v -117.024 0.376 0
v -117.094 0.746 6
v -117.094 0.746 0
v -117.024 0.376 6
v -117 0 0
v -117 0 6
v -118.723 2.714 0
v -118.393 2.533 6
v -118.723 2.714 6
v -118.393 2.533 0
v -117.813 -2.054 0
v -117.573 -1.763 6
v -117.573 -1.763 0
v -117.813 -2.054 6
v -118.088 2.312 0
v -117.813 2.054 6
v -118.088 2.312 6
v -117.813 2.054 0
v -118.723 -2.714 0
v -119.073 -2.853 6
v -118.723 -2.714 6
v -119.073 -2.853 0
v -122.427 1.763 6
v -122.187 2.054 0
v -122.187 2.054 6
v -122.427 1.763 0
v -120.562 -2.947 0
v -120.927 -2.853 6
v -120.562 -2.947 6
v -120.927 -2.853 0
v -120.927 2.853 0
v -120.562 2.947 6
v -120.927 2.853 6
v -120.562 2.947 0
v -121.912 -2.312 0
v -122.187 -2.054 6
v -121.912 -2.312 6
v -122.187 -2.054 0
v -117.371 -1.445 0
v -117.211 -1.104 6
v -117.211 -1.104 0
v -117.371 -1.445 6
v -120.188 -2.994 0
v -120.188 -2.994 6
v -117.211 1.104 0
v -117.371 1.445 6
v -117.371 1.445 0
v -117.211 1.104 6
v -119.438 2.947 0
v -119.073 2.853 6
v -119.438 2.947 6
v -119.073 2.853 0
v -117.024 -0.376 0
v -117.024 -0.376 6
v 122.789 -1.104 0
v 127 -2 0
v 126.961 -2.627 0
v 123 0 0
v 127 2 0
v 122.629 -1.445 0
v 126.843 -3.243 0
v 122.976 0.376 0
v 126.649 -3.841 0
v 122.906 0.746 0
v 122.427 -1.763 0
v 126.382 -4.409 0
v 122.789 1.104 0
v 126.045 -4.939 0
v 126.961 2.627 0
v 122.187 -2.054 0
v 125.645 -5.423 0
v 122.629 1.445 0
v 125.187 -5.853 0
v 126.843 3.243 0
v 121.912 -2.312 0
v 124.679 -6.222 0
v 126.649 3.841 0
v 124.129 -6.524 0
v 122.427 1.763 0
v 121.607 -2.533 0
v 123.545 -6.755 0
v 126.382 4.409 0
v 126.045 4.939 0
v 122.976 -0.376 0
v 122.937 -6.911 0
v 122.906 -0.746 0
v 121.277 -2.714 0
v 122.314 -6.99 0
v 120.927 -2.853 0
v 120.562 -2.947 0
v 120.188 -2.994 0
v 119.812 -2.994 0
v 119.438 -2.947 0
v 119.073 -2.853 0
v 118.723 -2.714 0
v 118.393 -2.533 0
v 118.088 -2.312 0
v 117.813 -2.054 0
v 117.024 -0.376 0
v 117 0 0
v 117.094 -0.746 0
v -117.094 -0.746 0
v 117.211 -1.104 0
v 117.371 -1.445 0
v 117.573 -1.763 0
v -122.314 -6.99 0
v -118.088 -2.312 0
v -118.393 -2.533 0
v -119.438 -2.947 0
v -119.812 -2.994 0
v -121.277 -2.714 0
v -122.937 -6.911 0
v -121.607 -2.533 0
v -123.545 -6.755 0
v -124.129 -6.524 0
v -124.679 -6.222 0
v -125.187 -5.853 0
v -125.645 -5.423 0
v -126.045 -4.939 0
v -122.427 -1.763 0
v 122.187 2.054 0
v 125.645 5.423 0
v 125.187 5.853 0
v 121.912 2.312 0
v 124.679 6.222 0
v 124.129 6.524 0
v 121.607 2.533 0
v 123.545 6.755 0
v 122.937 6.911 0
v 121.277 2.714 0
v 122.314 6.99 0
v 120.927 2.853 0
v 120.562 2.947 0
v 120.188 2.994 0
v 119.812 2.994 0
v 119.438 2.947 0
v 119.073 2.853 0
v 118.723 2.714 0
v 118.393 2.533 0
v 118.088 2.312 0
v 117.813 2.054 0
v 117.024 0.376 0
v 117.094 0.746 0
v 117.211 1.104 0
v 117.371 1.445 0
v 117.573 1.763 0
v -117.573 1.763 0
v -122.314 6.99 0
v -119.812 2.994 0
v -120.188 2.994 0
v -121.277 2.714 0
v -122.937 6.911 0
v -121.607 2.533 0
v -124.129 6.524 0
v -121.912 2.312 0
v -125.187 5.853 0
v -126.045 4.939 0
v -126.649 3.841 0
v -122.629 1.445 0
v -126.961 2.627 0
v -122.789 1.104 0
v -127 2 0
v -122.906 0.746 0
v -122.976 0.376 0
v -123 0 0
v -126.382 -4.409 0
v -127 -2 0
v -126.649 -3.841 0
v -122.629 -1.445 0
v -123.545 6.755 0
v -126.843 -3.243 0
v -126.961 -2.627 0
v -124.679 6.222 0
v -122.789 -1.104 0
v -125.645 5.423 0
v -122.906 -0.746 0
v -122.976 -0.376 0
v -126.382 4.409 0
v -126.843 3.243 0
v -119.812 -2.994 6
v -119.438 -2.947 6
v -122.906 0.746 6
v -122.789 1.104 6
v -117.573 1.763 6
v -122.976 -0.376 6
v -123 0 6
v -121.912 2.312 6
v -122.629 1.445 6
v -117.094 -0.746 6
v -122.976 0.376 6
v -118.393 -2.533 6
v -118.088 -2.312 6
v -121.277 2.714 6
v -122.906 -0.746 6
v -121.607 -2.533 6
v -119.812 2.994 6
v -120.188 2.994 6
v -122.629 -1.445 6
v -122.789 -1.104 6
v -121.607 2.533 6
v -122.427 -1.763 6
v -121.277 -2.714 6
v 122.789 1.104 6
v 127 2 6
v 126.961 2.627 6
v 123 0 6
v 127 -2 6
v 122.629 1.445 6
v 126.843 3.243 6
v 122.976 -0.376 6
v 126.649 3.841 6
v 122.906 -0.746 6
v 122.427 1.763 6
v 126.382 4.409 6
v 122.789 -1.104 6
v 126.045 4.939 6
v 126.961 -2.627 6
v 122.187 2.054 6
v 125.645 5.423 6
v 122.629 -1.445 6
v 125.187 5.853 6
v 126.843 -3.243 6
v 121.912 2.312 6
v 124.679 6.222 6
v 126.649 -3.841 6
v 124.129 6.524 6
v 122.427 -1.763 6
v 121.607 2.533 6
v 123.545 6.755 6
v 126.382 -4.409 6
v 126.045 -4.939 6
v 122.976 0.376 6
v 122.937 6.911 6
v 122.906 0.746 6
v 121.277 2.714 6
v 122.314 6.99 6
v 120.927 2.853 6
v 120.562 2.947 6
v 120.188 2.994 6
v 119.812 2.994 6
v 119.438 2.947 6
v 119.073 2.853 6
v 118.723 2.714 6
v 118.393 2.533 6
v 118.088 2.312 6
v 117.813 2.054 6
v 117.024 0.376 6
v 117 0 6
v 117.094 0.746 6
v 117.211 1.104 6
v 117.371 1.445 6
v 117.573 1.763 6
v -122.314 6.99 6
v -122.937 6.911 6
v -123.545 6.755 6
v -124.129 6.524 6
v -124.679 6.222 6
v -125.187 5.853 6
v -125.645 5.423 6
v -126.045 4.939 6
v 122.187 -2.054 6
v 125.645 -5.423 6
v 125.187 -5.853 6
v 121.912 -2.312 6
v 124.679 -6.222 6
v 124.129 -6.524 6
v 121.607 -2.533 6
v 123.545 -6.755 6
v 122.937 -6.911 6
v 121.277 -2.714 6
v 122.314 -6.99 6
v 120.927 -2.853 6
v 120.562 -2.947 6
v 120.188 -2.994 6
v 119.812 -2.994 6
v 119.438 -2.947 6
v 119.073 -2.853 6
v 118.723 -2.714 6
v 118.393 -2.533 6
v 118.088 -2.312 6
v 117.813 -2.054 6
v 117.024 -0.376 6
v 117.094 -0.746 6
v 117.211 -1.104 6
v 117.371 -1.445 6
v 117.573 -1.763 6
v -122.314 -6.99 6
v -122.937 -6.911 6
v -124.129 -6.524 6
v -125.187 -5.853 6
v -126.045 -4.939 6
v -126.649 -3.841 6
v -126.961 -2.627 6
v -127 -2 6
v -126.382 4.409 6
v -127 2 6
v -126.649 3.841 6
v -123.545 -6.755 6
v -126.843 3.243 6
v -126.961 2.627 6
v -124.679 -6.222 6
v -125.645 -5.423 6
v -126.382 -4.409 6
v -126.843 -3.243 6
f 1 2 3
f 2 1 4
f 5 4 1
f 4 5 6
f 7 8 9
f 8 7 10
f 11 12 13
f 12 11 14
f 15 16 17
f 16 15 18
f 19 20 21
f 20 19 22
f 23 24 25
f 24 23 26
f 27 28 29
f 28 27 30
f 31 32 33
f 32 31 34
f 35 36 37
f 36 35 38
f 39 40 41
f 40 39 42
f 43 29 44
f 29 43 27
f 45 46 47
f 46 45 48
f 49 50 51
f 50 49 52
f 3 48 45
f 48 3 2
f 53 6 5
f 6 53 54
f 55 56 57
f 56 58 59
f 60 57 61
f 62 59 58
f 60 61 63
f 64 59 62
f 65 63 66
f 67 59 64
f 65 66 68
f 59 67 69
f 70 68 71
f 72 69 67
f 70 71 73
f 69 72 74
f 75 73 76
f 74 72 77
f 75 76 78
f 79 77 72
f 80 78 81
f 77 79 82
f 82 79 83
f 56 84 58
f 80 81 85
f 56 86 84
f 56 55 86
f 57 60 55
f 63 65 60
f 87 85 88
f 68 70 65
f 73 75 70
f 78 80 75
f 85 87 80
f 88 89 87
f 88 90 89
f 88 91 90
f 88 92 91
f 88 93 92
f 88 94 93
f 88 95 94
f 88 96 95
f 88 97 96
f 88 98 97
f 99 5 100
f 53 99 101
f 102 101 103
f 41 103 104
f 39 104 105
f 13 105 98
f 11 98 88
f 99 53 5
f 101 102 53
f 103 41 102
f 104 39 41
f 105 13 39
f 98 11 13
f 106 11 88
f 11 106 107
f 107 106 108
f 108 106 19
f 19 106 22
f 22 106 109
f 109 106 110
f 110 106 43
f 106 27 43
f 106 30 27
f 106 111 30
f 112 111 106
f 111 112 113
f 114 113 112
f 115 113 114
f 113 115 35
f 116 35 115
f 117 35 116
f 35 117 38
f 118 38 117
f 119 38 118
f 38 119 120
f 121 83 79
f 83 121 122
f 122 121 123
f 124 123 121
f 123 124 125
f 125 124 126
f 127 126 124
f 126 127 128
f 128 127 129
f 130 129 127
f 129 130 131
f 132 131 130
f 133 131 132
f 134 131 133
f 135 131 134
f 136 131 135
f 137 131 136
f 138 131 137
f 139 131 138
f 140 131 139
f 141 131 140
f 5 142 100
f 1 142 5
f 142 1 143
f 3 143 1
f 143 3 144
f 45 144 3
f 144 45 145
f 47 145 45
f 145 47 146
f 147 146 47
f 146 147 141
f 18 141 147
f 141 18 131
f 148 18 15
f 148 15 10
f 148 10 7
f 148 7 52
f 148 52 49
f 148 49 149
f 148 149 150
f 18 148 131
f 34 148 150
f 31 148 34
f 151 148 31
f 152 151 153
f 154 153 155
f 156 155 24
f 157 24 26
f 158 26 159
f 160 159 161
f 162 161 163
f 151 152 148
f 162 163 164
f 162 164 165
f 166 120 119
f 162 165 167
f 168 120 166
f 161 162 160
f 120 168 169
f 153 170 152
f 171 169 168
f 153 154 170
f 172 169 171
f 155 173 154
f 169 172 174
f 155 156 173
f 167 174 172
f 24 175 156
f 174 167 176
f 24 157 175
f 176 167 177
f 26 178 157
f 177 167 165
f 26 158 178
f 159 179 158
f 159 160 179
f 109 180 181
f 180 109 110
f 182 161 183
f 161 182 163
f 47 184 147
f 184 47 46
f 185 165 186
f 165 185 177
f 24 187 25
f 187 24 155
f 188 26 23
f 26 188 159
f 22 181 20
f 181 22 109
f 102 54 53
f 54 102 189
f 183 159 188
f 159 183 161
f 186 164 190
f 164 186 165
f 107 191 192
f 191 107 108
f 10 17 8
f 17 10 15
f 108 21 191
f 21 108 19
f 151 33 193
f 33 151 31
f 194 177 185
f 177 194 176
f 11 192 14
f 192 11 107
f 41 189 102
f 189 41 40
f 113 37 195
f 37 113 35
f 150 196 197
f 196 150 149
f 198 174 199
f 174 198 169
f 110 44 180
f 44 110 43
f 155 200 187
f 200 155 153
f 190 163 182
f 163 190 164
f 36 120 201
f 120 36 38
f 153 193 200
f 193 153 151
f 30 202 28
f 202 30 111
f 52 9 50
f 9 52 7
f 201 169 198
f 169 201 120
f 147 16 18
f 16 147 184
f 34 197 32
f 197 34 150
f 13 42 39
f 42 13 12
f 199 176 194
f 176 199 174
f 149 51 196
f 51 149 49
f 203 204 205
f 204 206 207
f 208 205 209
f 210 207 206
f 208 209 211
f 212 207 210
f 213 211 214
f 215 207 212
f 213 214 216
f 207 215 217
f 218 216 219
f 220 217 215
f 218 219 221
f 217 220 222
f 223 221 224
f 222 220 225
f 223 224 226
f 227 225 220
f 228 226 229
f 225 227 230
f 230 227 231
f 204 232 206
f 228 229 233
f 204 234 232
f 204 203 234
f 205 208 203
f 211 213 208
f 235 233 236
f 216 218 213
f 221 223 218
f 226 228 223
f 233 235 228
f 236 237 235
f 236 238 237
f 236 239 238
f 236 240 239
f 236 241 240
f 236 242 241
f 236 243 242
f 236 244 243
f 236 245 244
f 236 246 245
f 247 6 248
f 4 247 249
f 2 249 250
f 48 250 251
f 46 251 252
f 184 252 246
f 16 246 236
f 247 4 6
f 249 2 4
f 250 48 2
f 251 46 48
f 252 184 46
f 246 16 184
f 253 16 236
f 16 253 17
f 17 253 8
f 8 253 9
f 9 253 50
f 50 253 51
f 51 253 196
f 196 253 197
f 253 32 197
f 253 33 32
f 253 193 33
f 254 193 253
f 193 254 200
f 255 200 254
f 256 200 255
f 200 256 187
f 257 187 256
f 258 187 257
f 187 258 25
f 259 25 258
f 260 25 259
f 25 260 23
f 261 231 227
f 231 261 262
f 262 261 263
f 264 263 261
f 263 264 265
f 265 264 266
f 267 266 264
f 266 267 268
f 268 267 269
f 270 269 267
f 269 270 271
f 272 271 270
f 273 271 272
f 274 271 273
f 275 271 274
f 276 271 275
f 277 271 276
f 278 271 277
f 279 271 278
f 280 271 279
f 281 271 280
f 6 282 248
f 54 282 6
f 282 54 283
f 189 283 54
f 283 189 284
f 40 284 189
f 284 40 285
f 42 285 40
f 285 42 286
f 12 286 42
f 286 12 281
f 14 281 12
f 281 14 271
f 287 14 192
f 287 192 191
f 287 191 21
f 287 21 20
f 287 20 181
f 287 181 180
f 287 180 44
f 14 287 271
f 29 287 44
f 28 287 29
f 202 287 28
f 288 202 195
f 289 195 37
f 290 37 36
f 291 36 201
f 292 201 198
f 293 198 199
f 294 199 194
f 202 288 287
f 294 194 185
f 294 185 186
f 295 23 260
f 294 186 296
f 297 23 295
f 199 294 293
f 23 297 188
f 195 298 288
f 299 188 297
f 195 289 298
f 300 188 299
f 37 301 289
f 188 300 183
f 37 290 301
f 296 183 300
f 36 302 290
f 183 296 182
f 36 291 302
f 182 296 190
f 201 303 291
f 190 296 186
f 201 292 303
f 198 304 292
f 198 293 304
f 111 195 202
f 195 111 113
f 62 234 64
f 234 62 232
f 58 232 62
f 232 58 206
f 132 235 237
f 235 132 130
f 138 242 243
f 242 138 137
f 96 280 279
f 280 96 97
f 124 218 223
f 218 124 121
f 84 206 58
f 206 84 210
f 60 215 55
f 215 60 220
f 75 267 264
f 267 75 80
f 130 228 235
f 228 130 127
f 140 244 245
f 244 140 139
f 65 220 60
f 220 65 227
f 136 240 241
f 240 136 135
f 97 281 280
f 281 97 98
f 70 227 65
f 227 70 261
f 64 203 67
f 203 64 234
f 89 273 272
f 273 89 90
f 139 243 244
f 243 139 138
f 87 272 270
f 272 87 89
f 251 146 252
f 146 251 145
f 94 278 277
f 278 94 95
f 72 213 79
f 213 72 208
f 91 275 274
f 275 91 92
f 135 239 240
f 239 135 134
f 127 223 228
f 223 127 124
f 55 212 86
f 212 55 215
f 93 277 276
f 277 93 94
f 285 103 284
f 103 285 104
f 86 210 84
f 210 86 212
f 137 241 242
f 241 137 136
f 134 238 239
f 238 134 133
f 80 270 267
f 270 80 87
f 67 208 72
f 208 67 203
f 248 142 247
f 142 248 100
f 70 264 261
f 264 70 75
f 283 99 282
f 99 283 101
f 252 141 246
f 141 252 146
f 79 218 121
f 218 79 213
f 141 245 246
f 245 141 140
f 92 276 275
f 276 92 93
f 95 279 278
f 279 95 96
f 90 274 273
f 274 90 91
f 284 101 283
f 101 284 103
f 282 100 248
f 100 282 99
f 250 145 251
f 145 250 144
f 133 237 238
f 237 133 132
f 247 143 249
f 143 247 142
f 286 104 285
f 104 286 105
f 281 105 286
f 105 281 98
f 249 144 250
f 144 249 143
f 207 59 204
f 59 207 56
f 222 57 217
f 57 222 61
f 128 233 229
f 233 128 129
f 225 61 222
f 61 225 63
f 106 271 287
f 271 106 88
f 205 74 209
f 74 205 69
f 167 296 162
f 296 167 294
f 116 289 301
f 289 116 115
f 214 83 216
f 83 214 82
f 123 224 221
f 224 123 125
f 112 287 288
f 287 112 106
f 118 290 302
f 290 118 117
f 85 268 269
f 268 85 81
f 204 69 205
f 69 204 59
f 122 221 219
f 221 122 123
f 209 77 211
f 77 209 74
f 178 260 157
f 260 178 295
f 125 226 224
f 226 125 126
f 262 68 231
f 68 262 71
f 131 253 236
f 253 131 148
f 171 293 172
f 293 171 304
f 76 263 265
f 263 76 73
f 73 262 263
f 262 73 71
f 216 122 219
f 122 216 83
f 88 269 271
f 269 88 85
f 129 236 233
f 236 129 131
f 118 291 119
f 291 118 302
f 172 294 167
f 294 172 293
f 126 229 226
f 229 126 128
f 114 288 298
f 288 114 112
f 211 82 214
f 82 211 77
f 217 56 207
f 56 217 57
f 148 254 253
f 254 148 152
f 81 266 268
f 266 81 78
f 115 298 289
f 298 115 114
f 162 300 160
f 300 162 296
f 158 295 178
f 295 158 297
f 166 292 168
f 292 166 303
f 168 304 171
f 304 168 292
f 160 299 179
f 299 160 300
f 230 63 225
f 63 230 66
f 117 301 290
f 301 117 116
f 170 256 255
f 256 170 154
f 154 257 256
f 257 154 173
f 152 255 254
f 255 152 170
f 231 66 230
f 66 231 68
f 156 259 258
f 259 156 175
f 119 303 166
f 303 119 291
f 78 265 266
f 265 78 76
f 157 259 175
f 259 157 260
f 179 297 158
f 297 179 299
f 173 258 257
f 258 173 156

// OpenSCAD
$fn = 50;


difference() {
	union() {
		hull() {
			translate(v = [-122.0000000000, 2.0000000000, 0]) {
				cylinder(h = 6, r = 5);
			}
			translate(v = [122.0000000000, 2.0000000000, 0]) {
				cylinder(h = 6, r = 5);
			}
			translate(v = [-122.0000000000, -2.0000000000, 0]) {
				cylinder(h = 6, r = 5);
			}
			translate(v = [122.0000000000, -2.0000000000, 0]) {
				cylinder(h = 6, r = 5);
			}
		}
	}
	union() {
		translate(v = [-120.0000000000, 0.0000000000, 0]) {
			cylinder(h = 6, r = 3.0000000000);
		}
		translate(v = [120.0000000000, 0.0000000000, 0]) {
			cylinder(h = 6, r = 3.0000000000);
		}
		translate(v = [-120.0000000000, 0.0000000000, 0]) {
			cylinder(h = 6, r = 1.5000000000);
		}
		translate(v = [120.0000000000, 0.0000000000, 0]) {
			cylinder(h = 6, r = 1.5000000000);
		}
		translate(v = [-120.0000000000, 0.0000000000, 0]) {
			cylinder(h = 6, r = 1.5000000000);
		}
		translate(v = [120.0000000000, 0.0000000000, 0]) {
			cylinder(h = 6, r = 1.5000000000);
		}
		translate(v = [-120.0000000000, 0.0000000000, 0]) {
			cylinder(h = 6, r = 1.5000000000);
		}
		translate(v = [120.0000000000, 0.0000000000, 0]) {
			cylinder(h = 6, r = 1.5000000000);
		}
	}
}
